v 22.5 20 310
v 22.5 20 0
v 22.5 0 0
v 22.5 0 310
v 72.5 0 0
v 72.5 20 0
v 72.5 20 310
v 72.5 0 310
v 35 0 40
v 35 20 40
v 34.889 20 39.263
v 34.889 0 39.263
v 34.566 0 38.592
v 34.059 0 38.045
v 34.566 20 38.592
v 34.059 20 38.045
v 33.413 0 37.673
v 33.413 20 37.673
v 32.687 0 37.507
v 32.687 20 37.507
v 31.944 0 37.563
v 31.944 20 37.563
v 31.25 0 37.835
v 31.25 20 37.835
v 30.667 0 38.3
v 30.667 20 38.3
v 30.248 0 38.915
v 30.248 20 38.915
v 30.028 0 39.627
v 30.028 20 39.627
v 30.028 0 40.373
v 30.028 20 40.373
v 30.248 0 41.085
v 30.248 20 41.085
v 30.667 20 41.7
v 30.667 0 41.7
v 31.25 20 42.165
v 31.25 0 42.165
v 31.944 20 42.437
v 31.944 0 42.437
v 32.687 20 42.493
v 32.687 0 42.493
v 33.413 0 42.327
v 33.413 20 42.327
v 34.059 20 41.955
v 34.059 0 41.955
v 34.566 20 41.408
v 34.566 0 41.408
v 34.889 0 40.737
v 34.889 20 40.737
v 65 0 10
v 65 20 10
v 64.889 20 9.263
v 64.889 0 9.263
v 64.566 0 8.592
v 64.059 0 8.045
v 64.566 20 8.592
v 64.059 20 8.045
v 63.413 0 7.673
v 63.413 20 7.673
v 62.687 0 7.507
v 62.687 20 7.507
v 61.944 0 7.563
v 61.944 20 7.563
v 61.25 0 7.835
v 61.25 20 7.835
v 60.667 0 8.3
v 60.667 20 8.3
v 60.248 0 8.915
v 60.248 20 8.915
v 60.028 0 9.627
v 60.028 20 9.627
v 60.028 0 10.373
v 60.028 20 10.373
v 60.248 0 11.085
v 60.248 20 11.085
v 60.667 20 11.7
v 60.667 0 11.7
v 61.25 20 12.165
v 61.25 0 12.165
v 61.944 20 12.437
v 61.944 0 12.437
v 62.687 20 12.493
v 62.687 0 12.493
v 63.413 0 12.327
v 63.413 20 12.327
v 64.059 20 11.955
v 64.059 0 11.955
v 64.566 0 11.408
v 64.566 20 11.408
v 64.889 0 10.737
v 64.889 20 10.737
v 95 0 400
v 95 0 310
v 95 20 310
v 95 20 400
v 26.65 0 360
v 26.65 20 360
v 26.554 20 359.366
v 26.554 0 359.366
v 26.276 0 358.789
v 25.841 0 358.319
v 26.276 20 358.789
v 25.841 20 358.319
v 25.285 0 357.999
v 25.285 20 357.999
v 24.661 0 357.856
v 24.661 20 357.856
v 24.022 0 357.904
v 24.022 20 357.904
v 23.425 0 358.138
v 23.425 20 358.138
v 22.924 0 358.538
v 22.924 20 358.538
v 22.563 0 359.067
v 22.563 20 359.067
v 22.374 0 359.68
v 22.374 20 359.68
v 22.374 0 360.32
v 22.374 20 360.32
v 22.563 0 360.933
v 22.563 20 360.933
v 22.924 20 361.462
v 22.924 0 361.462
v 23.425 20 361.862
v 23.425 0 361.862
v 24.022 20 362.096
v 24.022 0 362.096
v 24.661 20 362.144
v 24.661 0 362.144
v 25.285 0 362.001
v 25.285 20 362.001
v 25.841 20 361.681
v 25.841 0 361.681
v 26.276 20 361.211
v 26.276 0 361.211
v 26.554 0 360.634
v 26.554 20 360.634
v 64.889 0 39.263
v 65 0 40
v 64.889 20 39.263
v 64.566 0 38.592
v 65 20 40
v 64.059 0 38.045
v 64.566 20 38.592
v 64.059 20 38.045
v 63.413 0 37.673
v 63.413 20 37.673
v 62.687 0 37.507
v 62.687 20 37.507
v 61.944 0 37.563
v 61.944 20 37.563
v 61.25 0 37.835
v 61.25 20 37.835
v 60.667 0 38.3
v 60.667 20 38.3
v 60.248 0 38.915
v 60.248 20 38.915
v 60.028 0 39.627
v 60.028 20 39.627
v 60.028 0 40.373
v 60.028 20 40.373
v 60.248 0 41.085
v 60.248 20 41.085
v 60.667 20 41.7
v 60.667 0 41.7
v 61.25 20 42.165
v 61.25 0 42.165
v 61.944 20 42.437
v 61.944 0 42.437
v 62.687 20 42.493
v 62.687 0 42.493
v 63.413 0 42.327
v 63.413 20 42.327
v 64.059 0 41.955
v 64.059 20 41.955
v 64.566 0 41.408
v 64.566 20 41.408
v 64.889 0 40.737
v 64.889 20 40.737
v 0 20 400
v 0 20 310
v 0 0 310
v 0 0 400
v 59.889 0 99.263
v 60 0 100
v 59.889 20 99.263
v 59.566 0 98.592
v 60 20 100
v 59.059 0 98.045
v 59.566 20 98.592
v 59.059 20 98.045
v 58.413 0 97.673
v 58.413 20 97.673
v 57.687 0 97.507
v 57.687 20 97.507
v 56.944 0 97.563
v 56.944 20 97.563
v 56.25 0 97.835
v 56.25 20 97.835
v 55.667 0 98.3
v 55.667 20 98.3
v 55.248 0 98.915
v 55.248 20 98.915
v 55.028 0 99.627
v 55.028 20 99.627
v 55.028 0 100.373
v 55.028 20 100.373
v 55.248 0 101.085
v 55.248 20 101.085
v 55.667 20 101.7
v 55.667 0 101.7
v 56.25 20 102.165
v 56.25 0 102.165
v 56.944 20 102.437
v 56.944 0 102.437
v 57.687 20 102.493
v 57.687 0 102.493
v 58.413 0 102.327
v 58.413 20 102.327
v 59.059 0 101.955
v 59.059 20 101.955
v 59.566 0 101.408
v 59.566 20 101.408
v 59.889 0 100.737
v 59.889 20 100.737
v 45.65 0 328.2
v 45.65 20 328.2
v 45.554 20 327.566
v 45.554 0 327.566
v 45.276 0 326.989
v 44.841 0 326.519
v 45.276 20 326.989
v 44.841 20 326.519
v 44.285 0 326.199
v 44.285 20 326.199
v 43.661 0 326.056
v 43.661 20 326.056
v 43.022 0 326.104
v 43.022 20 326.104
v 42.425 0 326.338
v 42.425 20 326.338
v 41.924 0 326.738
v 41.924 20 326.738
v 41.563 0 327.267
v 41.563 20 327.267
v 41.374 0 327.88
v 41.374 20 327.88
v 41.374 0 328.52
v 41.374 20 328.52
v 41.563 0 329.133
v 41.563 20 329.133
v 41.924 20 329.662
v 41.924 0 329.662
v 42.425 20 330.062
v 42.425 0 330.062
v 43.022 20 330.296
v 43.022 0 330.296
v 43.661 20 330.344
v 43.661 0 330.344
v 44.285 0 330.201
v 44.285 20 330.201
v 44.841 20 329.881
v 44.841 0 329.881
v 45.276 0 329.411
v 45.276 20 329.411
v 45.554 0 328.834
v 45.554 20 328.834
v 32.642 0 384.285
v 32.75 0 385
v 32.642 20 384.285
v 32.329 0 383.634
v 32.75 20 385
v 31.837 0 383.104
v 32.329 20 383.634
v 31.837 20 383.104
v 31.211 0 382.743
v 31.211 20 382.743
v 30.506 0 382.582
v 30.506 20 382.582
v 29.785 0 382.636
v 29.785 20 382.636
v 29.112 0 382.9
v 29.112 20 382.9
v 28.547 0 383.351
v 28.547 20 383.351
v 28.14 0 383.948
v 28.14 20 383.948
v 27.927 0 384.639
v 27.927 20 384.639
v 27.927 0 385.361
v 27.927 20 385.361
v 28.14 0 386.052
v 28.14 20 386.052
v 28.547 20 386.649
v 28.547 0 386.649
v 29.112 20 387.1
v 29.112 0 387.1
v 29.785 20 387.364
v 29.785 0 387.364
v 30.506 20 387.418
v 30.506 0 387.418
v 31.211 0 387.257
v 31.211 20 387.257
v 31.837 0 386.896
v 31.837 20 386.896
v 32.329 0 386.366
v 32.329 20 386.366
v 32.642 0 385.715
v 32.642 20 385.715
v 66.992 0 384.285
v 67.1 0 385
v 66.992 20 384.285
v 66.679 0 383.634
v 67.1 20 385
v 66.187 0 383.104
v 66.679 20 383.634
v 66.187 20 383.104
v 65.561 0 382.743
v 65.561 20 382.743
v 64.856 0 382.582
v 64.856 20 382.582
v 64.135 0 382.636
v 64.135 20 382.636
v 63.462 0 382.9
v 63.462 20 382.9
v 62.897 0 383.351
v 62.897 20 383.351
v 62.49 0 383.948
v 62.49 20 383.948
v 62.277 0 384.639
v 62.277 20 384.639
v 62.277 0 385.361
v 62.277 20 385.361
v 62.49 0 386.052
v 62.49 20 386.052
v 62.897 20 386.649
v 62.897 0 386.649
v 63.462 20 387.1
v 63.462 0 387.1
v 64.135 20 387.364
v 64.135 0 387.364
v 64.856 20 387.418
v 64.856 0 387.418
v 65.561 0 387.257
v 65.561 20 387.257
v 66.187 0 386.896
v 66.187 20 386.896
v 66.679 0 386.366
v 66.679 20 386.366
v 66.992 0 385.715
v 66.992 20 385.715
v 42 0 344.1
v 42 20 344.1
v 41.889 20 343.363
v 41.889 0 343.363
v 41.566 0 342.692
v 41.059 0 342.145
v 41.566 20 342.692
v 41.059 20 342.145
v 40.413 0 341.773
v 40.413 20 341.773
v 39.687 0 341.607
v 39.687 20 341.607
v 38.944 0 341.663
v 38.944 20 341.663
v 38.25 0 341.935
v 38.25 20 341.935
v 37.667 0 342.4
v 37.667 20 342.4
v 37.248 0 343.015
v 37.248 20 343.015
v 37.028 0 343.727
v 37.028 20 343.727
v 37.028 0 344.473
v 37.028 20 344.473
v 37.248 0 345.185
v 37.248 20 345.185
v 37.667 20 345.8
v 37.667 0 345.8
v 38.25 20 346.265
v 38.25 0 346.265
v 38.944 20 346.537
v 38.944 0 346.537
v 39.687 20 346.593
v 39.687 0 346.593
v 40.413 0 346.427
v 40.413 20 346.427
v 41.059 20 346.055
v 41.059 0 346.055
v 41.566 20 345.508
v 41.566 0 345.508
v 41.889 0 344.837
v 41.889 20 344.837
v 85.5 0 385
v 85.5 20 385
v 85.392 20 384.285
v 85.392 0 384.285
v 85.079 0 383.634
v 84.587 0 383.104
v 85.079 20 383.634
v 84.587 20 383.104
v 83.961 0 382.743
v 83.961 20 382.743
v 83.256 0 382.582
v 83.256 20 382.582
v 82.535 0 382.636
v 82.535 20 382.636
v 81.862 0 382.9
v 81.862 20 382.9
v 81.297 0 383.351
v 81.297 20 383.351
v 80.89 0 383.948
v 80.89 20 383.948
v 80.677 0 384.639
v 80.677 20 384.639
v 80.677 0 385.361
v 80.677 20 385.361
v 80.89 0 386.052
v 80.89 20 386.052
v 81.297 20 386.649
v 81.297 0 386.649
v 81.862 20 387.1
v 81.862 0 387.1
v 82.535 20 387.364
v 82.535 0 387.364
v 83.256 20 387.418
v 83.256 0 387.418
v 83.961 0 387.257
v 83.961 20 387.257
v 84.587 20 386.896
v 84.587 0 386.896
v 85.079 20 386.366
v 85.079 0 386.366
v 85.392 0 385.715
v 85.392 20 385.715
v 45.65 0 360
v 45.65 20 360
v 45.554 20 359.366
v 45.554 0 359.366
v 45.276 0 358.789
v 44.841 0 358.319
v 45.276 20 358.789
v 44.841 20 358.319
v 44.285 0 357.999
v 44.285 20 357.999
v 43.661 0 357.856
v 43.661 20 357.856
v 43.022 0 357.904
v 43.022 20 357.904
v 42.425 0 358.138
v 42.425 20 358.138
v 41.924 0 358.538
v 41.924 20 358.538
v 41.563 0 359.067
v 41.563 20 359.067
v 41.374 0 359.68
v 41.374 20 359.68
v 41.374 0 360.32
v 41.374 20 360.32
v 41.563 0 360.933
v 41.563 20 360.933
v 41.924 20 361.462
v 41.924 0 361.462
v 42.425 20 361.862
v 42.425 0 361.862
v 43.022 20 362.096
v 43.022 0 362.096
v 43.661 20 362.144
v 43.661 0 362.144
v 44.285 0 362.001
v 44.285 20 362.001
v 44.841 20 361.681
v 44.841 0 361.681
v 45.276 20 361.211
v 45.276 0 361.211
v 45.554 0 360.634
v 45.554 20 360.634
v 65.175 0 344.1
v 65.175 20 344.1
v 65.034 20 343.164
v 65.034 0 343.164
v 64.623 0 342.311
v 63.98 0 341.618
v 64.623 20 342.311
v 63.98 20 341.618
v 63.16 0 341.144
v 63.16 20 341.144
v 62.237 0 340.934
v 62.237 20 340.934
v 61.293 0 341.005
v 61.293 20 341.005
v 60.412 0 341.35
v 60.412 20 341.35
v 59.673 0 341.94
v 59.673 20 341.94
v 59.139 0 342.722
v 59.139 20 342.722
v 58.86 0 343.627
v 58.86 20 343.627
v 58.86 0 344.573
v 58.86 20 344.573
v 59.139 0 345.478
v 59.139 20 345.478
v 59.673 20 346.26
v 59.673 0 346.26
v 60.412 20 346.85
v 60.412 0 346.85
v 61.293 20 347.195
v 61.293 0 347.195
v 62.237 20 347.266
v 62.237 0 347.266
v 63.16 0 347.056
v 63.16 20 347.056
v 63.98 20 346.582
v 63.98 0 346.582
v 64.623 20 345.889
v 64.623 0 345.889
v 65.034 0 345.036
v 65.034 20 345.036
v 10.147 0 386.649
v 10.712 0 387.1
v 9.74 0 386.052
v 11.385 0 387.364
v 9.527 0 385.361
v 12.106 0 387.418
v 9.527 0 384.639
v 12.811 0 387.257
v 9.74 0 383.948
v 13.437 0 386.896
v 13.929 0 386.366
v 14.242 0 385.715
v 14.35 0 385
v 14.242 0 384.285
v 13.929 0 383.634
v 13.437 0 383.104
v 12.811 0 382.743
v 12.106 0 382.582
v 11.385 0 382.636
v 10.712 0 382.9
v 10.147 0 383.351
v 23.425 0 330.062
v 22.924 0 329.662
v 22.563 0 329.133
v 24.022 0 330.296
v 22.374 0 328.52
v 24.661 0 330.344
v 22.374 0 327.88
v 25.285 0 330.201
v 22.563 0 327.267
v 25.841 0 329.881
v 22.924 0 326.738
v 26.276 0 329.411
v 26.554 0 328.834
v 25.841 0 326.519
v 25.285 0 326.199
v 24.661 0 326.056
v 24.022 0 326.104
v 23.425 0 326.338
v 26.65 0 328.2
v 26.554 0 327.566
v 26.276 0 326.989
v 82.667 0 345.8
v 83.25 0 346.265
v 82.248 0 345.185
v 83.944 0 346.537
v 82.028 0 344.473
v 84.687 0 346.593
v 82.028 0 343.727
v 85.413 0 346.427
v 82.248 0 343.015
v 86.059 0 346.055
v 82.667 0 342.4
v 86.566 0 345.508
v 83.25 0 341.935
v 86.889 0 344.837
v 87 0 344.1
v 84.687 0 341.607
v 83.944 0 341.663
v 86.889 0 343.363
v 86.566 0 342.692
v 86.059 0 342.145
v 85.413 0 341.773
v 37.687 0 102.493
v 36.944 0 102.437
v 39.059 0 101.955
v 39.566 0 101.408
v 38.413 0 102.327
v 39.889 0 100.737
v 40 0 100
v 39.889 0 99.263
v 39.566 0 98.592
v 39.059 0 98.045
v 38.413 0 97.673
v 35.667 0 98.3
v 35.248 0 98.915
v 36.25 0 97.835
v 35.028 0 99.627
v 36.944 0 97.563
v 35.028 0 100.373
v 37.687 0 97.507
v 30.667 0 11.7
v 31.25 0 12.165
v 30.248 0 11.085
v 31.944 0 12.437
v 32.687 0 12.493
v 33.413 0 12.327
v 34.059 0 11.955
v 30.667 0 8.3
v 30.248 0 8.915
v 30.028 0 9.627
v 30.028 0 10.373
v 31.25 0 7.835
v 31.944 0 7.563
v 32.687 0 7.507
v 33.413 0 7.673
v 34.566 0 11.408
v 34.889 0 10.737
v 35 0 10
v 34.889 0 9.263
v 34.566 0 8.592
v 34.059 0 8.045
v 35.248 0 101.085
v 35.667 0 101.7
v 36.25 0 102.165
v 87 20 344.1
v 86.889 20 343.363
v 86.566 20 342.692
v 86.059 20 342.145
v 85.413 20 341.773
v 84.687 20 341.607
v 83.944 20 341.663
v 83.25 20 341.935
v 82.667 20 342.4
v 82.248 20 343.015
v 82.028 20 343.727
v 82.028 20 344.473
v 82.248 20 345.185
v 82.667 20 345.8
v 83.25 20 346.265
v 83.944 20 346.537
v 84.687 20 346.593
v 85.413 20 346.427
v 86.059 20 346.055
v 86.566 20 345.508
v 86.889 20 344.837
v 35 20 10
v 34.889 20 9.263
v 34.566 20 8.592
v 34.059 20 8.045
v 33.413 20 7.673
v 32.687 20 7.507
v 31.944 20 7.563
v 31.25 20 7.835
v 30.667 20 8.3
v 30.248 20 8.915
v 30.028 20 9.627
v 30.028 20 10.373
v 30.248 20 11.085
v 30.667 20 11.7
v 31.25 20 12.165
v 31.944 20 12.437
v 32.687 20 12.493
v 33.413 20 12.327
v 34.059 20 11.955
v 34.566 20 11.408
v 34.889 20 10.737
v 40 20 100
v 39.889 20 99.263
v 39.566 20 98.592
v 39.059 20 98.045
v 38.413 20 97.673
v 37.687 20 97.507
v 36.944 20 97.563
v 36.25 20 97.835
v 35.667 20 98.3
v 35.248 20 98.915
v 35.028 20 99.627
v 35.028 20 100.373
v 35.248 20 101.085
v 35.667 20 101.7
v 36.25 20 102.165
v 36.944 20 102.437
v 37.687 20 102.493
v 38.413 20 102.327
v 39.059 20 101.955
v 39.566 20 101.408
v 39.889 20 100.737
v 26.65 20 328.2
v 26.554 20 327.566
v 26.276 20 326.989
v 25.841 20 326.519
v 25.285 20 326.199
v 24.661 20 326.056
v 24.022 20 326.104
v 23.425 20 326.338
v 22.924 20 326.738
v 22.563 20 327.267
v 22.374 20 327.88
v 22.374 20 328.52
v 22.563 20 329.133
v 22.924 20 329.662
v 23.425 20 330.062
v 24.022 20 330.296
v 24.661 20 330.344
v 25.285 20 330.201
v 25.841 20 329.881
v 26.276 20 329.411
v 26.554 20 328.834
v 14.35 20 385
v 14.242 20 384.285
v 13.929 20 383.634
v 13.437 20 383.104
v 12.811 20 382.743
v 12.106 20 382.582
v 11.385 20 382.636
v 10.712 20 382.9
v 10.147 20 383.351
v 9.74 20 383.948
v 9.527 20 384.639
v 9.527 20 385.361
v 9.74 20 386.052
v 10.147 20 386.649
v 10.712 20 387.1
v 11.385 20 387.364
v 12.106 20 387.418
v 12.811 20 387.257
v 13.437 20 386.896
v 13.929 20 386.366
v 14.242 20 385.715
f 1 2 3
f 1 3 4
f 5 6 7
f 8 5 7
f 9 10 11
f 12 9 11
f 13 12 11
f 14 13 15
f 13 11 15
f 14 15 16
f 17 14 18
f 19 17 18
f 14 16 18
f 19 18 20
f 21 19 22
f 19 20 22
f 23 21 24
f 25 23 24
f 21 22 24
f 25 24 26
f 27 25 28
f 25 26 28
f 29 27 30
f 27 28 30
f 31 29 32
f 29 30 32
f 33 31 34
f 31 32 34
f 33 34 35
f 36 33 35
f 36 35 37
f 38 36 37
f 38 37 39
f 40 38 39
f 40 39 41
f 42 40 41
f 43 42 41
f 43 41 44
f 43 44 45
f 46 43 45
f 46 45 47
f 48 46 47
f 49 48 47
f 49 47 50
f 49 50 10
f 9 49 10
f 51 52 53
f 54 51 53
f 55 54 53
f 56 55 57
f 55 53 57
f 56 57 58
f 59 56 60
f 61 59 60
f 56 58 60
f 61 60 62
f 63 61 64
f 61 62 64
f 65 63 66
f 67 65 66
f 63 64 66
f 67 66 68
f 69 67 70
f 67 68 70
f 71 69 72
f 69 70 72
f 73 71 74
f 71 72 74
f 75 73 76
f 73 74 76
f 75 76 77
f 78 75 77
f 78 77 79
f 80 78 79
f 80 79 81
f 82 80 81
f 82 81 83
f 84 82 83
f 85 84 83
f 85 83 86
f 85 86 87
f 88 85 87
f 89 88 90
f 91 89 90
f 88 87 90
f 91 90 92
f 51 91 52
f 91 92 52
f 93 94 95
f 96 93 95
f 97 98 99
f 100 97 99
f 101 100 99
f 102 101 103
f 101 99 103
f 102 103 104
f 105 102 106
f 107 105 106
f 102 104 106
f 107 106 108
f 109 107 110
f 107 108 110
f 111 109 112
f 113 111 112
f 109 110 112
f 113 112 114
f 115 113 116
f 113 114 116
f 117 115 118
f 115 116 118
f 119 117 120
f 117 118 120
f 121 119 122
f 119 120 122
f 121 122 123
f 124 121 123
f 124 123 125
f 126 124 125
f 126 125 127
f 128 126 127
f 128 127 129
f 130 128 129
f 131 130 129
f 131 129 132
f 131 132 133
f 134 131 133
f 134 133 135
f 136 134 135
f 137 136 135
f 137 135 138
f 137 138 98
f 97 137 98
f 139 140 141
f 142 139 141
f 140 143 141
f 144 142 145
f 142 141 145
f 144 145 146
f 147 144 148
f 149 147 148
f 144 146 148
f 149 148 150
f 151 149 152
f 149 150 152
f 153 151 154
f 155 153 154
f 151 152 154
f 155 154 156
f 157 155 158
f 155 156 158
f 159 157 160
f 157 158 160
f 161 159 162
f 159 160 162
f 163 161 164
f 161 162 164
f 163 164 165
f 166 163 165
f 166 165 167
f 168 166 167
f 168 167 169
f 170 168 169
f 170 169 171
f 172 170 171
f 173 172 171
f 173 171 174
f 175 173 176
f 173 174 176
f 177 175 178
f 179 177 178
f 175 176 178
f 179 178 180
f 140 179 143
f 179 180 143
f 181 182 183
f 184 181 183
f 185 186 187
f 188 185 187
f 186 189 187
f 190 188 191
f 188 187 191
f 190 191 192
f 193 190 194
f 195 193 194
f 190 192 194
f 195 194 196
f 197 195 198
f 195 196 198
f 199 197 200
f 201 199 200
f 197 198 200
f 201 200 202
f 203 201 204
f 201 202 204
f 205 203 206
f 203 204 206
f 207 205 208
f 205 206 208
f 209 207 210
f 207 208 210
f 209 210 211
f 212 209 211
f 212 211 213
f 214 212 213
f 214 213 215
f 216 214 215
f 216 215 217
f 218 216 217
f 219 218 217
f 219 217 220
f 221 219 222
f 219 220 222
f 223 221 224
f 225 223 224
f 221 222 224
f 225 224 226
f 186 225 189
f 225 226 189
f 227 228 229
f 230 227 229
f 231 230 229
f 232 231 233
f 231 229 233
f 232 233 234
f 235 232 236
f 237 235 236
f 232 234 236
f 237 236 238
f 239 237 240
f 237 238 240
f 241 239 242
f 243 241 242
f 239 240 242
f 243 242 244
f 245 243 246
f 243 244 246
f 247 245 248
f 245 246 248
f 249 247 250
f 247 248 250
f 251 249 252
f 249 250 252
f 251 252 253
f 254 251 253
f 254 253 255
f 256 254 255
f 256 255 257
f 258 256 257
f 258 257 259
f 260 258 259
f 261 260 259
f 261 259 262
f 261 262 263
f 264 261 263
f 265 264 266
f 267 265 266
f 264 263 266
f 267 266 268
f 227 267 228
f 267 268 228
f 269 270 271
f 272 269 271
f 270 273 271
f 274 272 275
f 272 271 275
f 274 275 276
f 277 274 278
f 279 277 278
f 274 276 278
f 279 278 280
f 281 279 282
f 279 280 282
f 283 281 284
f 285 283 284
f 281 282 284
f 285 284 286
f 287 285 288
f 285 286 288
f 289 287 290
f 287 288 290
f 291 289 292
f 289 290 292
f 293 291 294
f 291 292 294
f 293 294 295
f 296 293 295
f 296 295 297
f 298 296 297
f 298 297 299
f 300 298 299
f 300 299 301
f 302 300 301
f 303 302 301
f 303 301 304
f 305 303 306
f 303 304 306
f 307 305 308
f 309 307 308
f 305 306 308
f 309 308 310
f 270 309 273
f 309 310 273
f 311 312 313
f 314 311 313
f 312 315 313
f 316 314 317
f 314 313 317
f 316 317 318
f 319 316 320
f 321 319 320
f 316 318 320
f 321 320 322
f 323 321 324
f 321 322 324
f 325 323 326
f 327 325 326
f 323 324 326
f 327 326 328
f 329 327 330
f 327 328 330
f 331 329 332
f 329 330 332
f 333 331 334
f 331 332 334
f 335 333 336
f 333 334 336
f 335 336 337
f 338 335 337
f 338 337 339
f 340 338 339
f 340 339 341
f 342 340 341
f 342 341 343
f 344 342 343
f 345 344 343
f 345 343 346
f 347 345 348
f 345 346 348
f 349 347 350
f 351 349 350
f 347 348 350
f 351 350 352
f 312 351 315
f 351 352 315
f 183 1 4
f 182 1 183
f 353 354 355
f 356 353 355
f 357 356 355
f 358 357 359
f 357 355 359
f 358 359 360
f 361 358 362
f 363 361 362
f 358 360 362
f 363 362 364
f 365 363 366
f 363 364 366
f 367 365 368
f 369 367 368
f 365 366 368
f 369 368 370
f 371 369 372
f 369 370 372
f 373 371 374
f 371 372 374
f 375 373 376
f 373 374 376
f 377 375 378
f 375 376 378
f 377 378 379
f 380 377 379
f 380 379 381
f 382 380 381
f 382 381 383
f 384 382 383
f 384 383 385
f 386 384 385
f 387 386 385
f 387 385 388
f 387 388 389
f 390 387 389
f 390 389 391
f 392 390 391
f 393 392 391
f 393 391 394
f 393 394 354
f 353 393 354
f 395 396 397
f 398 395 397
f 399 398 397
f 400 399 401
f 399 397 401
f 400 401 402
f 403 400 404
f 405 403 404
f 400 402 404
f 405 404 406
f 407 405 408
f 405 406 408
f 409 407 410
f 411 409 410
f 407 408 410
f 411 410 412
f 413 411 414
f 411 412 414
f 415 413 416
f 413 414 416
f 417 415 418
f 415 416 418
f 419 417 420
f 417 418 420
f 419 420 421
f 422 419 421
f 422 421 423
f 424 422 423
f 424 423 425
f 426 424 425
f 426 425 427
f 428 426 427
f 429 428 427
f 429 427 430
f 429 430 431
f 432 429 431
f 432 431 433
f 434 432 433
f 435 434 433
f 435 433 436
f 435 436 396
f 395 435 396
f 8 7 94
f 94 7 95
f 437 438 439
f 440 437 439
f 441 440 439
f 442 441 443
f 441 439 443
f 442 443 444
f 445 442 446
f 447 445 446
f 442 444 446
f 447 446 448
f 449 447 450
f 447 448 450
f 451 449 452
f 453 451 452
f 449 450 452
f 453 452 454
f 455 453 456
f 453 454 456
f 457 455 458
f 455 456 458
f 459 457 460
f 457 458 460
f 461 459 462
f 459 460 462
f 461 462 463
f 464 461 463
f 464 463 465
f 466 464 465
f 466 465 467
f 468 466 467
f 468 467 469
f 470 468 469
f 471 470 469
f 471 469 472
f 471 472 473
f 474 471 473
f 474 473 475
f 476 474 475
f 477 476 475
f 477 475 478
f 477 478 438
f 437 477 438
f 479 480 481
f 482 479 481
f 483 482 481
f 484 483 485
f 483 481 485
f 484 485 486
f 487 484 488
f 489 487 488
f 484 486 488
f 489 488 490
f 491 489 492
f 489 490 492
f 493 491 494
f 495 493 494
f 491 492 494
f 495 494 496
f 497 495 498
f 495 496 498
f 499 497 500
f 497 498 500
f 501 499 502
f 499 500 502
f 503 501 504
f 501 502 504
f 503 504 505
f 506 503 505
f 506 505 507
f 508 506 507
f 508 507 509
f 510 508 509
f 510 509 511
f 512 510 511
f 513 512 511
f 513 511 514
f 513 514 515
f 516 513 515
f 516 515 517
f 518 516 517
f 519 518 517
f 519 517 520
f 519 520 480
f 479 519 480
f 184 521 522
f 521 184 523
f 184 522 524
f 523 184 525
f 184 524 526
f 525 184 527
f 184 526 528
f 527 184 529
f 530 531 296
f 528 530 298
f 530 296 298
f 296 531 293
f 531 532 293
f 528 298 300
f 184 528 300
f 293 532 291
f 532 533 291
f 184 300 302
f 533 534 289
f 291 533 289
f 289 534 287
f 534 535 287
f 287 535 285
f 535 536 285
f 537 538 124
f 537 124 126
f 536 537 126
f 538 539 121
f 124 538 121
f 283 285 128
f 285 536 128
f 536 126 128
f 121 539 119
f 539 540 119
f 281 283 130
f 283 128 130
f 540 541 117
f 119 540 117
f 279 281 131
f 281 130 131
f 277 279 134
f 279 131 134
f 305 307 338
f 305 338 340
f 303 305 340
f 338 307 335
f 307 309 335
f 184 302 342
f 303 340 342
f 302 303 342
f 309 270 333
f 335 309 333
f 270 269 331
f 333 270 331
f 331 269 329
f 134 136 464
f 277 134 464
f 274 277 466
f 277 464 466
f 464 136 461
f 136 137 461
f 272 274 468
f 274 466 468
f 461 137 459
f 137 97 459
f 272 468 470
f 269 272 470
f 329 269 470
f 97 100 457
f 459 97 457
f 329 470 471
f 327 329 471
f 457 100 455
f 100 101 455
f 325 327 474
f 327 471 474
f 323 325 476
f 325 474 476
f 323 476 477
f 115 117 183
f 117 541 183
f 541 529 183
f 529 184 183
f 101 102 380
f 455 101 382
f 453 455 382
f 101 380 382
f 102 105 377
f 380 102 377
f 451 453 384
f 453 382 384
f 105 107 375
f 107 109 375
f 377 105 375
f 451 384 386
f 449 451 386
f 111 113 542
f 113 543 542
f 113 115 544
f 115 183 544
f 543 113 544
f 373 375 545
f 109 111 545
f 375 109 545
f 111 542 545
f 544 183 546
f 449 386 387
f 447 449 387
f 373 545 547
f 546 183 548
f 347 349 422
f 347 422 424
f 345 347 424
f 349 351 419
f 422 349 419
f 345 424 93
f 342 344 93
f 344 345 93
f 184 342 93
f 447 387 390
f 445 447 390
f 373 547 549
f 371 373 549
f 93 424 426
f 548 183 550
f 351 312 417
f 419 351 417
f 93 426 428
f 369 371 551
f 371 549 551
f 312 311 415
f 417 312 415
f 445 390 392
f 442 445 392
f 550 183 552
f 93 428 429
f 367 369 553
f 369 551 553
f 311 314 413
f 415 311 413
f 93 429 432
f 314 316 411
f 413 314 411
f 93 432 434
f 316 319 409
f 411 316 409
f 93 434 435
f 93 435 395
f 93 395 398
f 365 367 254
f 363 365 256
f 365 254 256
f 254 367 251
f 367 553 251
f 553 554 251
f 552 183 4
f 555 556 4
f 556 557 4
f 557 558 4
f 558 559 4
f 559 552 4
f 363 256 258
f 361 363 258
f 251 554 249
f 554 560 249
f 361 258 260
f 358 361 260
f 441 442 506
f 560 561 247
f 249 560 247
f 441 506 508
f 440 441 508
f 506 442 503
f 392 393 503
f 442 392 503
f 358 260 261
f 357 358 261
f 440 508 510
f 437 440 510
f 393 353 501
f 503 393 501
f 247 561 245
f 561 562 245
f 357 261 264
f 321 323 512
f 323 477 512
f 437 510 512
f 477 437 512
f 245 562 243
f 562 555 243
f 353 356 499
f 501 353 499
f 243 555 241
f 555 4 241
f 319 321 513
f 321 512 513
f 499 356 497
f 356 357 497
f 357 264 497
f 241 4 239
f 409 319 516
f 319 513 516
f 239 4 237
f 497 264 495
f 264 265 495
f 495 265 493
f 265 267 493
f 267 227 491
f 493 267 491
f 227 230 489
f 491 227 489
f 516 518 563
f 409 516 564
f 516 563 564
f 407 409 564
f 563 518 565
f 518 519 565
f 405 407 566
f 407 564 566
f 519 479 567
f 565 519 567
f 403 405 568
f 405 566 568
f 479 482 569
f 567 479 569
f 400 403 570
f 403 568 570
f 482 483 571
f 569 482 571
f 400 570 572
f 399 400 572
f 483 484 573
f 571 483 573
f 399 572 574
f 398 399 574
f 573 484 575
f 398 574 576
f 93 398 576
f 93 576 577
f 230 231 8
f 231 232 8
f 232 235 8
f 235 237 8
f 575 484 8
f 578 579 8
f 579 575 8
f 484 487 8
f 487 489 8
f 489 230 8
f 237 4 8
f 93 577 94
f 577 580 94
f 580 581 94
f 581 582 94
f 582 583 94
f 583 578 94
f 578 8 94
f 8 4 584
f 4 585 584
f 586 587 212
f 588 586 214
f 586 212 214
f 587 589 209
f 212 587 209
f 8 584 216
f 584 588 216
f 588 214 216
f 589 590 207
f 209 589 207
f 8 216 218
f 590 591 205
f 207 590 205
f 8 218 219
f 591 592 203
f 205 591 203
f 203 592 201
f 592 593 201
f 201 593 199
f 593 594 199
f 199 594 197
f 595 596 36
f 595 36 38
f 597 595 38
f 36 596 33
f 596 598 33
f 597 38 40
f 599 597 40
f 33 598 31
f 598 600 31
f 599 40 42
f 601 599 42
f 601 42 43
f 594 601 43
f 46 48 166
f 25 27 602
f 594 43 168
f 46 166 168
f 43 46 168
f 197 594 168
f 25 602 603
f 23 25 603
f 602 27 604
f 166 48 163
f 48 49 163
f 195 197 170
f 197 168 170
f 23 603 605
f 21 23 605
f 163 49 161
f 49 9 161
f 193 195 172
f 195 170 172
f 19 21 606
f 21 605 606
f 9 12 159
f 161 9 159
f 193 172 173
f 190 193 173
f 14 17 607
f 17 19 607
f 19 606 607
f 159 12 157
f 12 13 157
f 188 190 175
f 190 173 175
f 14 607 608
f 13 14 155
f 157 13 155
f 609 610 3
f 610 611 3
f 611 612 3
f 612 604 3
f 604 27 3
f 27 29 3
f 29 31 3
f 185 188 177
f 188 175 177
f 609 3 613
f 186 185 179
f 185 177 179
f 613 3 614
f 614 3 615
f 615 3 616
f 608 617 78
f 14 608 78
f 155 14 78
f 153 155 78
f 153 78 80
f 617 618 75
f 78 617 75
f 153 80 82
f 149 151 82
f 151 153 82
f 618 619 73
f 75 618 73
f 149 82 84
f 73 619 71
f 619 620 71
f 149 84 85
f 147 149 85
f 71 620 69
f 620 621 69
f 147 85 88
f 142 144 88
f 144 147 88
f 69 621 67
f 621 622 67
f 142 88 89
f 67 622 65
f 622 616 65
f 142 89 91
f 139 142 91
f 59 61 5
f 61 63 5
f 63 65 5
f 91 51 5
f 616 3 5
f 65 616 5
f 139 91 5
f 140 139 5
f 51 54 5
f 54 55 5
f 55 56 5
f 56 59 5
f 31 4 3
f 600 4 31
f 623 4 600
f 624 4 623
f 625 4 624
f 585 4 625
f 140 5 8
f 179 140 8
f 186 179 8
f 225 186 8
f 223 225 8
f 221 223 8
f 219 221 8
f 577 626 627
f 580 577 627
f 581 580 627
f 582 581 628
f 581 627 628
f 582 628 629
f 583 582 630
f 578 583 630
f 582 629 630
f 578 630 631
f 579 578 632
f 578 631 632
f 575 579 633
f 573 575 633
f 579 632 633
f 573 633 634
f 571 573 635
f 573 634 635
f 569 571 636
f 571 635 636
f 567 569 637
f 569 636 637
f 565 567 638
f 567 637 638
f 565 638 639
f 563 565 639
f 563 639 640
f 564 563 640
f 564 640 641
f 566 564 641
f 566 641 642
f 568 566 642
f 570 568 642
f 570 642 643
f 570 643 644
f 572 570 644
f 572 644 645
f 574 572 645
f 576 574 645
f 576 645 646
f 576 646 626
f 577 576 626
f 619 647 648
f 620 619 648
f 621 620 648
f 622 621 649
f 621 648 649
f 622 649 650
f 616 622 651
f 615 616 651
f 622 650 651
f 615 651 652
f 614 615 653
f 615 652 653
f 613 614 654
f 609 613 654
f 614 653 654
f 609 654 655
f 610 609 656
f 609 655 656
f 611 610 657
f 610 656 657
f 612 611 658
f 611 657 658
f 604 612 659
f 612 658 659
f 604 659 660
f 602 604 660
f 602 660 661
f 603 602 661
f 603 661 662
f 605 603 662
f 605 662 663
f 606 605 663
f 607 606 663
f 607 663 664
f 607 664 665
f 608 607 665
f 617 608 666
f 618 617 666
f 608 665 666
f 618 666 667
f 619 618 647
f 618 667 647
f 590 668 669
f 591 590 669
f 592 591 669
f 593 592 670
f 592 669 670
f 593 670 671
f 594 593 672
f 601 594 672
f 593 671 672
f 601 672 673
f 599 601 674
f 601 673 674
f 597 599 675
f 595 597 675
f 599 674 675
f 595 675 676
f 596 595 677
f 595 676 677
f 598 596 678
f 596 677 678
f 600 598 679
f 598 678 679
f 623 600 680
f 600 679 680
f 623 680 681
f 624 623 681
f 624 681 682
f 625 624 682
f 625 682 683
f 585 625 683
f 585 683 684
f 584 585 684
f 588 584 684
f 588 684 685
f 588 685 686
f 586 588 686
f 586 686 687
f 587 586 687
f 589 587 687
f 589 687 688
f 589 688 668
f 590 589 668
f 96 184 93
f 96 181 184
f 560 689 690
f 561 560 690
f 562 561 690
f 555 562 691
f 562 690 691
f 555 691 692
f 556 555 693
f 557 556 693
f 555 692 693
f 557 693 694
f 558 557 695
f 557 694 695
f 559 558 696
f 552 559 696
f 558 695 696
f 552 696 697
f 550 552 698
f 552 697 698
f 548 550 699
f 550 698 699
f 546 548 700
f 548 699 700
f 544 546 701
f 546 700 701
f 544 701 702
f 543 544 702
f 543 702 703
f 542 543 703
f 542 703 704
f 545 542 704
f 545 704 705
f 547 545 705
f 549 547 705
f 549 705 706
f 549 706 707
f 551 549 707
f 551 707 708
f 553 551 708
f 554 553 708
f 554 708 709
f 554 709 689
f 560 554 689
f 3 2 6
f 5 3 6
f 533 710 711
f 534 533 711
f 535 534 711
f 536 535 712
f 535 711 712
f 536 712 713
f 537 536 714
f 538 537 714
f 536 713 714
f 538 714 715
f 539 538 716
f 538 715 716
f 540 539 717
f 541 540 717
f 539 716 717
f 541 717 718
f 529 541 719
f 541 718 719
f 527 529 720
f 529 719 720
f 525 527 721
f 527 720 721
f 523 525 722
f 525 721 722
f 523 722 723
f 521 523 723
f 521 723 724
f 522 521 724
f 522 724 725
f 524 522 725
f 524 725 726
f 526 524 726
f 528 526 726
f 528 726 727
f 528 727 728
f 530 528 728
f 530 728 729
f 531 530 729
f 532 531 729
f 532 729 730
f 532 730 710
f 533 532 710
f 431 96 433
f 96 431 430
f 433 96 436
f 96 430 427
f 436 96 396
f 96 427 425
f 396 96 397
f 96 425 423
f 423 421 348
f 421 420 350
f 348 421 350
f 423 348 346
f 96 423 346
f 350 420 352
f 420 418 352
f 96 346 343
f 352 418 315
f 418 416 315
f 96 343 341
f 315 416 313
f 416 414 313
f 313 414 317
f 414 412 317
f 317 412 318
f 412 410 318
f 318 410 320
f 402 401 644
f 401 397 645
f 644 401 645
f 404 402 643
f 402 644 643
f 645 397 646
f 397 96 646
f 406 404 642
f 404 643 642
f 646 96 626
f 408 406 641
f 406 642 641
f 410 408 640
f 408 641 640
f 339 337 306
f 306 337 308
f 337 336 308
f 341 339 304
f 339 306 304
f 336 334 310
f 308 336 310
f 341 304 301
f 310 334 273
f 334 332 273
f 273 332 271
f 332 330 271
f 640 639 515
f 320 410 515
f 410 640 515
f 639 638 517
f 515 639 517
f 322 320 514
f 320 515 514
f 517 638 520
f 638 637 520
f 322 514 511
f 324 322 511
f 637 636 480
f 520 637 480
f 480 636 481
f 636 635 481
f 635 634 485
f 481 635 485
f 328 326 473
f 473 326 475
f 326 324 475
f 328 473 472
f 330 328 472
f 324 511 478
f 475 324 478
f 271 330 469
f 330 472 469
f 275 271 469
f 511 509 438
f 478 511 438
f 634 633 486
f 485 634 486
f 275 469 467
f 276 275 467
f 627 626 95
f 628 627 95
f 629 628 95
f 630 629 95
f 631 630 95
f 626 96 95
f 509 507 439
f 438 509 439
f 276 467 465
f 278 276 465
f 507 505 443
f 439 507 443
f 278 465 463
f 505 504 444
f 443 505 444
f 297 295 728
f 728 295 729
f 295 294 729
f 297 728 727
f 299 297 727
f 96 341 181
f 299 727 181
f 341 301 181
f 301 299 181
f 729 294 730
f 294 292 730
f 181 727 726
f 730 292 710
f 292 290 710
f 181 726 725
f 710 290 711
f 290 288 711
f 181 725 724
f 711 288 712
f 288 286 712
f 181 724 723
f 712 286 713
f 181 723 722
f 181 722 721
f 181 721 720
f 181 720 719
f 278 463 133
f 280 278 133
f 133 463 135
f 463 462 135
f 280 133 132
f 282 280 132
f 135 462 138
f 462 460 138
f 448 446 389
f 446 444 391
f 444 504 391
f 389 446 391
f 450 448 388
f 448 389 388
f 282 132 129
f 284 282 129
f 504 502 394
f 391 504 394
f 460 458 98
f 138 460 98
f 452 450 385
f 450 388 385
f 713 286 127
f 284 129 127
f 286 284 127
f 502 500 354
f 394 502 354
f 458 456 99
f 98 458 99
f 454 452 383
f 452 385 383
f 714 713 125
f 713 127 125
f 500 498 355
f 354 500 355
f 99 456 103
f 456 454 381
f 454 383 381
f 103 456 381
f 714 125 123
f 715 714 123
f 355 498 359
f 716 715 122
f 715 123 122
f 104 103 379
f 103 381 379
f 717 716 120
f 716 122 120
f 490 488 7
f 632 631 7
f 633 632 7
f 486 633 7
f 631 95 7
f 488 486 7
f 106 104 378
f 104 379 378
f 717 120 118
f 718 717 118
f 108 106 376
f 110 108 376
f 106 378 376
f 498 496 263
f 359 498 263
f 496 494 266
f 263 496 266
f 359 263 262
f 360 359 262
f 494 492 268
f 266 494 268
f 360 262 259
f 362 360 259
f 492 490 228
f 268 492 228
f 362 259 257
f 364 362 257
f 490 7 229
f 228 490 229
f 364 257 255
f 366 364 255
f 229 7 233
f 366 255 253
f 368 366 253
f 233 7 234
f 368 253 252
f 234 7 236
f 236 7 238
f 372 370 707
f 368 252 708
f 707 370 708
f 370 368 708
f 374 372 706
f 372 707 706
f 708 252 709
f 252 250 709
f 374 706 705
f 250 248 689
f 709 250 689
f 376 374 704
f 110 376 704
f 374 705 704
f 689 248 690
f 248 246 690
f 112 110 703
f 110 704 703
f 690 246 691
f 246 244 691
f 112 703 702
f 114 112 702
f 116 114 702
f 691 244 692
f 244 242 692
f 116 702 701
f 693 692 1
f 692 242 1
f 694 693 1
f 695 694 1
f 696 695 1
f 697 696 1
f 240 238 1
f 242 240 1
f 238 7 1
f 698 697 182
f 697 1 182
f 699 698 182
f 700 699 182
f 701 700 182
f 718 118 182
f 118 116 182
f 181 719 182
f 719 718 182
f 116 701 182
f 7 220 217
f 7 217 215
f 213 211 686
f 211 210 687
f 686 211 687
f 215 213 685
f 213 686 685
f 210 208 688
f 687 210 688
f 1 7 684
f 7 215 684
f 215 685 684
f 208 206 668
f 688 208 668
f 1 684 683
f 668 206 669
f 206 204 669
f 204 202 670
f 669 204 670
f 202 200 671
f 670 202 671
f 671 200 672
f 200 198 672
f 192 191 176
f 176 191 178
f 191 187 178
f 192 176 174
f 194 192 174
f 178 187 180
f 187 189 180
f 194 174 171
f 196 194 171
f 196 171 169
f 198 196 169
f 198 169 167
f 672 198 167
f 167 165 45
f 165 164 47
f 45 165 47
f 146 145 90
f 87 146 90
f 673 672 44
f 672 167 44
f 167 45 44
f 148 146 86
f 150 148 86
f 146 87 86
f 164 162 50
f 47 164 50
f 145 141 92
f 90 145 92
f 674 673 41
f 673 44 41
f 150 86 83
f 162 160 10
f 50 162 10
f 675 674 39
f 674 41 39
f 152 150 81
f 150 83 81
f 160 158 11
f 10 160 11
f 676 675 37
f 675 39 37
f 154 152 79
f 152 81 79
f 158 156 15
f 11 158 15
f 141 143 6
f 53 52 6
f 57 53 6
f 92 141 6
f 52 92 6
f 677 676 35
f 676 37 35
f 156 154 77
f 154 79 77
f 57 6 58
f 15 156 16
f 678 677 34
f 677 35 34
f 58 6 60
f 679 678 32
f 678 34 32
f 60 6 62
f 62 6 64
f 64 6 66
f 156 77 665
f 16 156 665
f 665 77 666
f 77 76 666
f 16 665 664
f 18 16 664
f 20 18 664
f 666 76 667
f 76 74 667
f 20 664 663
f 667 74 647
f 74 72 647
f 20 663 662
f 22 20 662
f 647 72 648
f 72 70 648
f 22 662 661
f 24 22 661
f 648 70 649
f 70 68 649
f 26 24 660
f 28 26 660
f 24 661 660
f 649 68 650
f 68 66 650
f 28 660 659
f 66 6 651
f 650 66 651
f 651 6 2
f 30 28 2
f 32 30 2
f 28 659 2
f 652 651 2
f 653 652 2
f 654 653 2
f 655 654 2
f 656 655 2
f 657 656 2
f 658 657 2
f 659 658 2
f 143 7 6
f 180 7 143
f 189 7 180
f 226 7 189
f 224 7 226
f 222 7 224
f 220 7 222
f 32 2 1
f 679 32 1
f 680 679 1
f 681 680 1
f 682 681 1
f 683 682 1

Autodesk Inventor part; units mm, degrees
ref_plane "YZ Plane" through (0, 0, 0) normal (1, 0, 0) x (0, 1, 0)
ref_plane "XZ Plane" through (0, 0, 0) normal (0, 1, 0) x (-1, 0, 0)
ref_plane "XY Plane" through (0, 0, 0) normal (0, 0, 1) x (1, 0, 0)
sketch "Sketch1" plane through (0, 0, 0) normal (0, 0, 1) x (1, 0, 0)
  line L0 (0, 0) -> (95, 0)
  line L1 (95, 0) -> (95, 20)
  line L2 (95, 20) -> (0, 20)
  line L3 (0, 20) -> (0, 0)
  dimension "d0" = 95
  dimension "d1" = 20
extrude "Extrusion1" add sketch "Sketch1" along normal blind 400
sketch "Sketch4" plane through (0, 20, 0) normal (0, 1, 0) x (1, 0, 0)
  line L0 (95, 0) -> (0, 0) projected
  line L1 (0, 0) -> (0, -400) projected
  line L2 (95, -400) -> (0, -400) projected
  line L3 (95, 0) -> (95, -400) projected
  line L4 (95, -376.825) -> (95, -383.175) projected
  line L5 (0, -383.175) -> (0, -376.825) projected
  line L6 (95, 0) -> (72.5, 0)
  line L7 (72.5, 0) -> (72.5, -310)
  line L8 (72.5, -310) -> (95, -310)
  line L9 (95, -310) -> (95, 0)
  line L10 (0, 0) -> (22.5, 0)
  line L11 (22.5, 0) -> (22.5, -310)
  line L12 (22.5, -310) -> (0, -310)
  line L13 (0, -310) -> (0, 0)
  dimension "d30" = 90
  dimension "d31" = 50
  dimension "d32" = 22.5
extrude "Extrusion4" cut sketch "Sketch4" against normal up to next contours L3 L8 L7 L0 | L11 L12 L1 L0
sketch "Sketch5" plane through (0, 20, 400) normal (0, 1, 0) x (1, 0, 0)
  circle A0 centre (62.5, 360) radius 2.5
  circle A1 centre (32.5, 360) radius 2.5
  circle A2 centre (62.5, 390) radius 2.5
  circle A3 centre (32.5, 390) radius 2.5
  line L0 (22.5, 400) -> (22.5, 90) projected
  line L1 (22.5, 90) -> (0, 90) projected
  line L2 (0, 90) -> (0, 0) projected
  line L3 (95, 0) -> (0, 0) projected
  line L4 (95, 90) -> (95, 0) projected
  line L5 (95, 90) -> (72.5, 90) projected
  line L6 (72.5, 90) -> (72.5, 400) projected
  line L7 (72.5, 400) -> (22.5, 400) projected
  point P0 (0, 400)
  dimension "d35" = 5
  dimension "d36" = 5
  dimension "d37" = 5
  dimension "d38" = 5
  dimension "d39" = 30
  dimension "d40" = 30
  dimension "d41" = 10
  dimension "d42" = 10
  dimension "d43" = 30
  dimension "d44" = 30
  dimension "d45" = 10
  dimension "d46" = 10
extrude "Extrusion5" cut sketch "Sketch5" against normal up to next contours A0 | A1 | A2 | A3
sketch "Sketch8" plane through (0, 20, 400) normal (0, 1, 0) x (1, 0, 0)
  circle A0 centre (30.325, 15) radius 2.425
  circle A1 centre (11.925, 15) radius 2.425
  circle A2 centre (83.075, 15) radius 2.425
  circle A3 centre (64.675, 15) radius 2.425
  line L0 (0, 90) -> (0, 0) projected
  line L1 (95, 90) -> (95, 0) projected
  line L2 (95, 0) -> (0, 0) projected
  point P0 (0, 400)
  dimension "d60" = 4.85
  dimension "d61" = 4.85
  dimension "d62" = 4.85
  dimension "d63" = 4.85
  dimension "d64" = 11.925
  dimension "d65" = 18.4
  dimension "d66" = 11.925
  dimension "d67" = 18.4
  dimension "d68" = 15
  dimension "d69" = 15
  dimension "d70" = 15
  dimension "d71" = 15
extrude "Extrusion8" cut sketch "Sketch8" against normal up to next
sketch "Sketch9" plane through (0, 20, 400) normal (0, 1, 0) x (1, 0, 0)
  circle A0 centre (43.5, 40) radius 2.15
  circle A1 centre (43.5, 71.8) radius 2.15
  line L0 (95, 0) -> (0, 0) projected
  line L1 (0, 90) -> (0, 0) projected
  circle A2 centre (24.5, 40) radius 2.15
  circle A3 centre (24.5, 71.8) radius 2.15
  point P0 (0, 400)
  dimension "d74" = 4.3
  dimension "d75" = 4.3
  dimension "d76" = 31.8
  dimension "d77" = 40
  dimension "d80" = 4.3
  dimension "d81" = 4.3
  dimension "d82" = 19
  dimension "d83" = 19
  dimension "d84" = 31.8
  dimension "d85" = 40
  dimension "d86" = 24.5
  dimension "d87" = 24.5
extrude "Extrusion9" cut sketch "Sketch9" against normal up to next
sketch "Sketch10" plane through (0, 20, 400) normal (0, 1, 0) x (1, 0, 0)
  circle A0 centre (84.5, 55.9) radius 2.5
  circle A1 centre (39.5, 55.9) radius 2.5
  circle A2 centre (24.5, 40) radius 2.15 projected
  circle A3 centre (43.5, 40) radius 2.15 projected
  circle A4 centre (43.5, 71.8) radius 2.15 projected
  circle A5 centre (24.5, 71.8) radius 2.15 projected
  circle A6 centre (83.075, 15) radius 2.425 projected
  circle A7 centre (30.325, 15) radius 2.425 projected
  circle A8 centre (11.925, 15) radius 2.425 projected
  circle A9 centre (64.675, 15) radius 2.425 projected
  circle A10 centre (62.5, 390) radius 2.5 projected
  circle A11 centre (62.5, 360) radius 2.5 projected
  circle A12 centre (32.5, 360) radius 2.5 projected
  circle A13 centre (32.5, 390) radius 2.5 projected
  line L0 (22.5, 400) -> (22.5, 90) projected
  line L1 (22.5, 90) -> (0, 90) projected
  line L2 (0, 90) -> (0, 0) projected
  line L3 (95, 0) -> (0, 0) projected
  line L4 (95, 90) -> (95, 0) projected
  line L5 (95, 90) -> (72.5, 90) projected
  line L6 (72.5, 90) -> (72.5, 400) projected
  line L7 (72.5, 400) -> (22.5, 400) projected
  circle A14 centre (62, 55.9) radius 3.175
  point P0 (0, 400)
  dimension "d90" = 45
  dimension "d91" = 5
  dimension "d92" = 5
  dimension "d93" = 15.9
  dimension "d94" = 15.9
  dimension "d95" = 39.5
  dimension "d106" = 6.35
  dimension "d107" = 22.5
  dimension "d108" = 15.9
extrude "Extrusion10" cut sketch "Sketch10" against normal up to next contours A0 | A1 | A14
sketch "Sketch11" plane through (0, 20, 400) normal (0, 1, 0) x (1, 0, 0)
  circle A0 centre (57.5, 300) radius 2.5
  circle A1 centre (37.5, 300) radius 2.5
  line L0 (72.5, 400) -> (22.5, 400) projected
  line L1 (72.5, 90) -> (72.5, 400) projected
  point P0 (0, 400)
  dimension "d98" = 5
  dimension "d99" = 5
  dimension "d100" = 20
  dimension "d101" = 100
  dimension "d102" = 100
  dimension "d103" = 15
extrude "Extrusion11" cut sketch "Sketch11" against normal up to next
equation "\"d87\" = d86"
properties part number "Arm-SquareBar-Rev3"
